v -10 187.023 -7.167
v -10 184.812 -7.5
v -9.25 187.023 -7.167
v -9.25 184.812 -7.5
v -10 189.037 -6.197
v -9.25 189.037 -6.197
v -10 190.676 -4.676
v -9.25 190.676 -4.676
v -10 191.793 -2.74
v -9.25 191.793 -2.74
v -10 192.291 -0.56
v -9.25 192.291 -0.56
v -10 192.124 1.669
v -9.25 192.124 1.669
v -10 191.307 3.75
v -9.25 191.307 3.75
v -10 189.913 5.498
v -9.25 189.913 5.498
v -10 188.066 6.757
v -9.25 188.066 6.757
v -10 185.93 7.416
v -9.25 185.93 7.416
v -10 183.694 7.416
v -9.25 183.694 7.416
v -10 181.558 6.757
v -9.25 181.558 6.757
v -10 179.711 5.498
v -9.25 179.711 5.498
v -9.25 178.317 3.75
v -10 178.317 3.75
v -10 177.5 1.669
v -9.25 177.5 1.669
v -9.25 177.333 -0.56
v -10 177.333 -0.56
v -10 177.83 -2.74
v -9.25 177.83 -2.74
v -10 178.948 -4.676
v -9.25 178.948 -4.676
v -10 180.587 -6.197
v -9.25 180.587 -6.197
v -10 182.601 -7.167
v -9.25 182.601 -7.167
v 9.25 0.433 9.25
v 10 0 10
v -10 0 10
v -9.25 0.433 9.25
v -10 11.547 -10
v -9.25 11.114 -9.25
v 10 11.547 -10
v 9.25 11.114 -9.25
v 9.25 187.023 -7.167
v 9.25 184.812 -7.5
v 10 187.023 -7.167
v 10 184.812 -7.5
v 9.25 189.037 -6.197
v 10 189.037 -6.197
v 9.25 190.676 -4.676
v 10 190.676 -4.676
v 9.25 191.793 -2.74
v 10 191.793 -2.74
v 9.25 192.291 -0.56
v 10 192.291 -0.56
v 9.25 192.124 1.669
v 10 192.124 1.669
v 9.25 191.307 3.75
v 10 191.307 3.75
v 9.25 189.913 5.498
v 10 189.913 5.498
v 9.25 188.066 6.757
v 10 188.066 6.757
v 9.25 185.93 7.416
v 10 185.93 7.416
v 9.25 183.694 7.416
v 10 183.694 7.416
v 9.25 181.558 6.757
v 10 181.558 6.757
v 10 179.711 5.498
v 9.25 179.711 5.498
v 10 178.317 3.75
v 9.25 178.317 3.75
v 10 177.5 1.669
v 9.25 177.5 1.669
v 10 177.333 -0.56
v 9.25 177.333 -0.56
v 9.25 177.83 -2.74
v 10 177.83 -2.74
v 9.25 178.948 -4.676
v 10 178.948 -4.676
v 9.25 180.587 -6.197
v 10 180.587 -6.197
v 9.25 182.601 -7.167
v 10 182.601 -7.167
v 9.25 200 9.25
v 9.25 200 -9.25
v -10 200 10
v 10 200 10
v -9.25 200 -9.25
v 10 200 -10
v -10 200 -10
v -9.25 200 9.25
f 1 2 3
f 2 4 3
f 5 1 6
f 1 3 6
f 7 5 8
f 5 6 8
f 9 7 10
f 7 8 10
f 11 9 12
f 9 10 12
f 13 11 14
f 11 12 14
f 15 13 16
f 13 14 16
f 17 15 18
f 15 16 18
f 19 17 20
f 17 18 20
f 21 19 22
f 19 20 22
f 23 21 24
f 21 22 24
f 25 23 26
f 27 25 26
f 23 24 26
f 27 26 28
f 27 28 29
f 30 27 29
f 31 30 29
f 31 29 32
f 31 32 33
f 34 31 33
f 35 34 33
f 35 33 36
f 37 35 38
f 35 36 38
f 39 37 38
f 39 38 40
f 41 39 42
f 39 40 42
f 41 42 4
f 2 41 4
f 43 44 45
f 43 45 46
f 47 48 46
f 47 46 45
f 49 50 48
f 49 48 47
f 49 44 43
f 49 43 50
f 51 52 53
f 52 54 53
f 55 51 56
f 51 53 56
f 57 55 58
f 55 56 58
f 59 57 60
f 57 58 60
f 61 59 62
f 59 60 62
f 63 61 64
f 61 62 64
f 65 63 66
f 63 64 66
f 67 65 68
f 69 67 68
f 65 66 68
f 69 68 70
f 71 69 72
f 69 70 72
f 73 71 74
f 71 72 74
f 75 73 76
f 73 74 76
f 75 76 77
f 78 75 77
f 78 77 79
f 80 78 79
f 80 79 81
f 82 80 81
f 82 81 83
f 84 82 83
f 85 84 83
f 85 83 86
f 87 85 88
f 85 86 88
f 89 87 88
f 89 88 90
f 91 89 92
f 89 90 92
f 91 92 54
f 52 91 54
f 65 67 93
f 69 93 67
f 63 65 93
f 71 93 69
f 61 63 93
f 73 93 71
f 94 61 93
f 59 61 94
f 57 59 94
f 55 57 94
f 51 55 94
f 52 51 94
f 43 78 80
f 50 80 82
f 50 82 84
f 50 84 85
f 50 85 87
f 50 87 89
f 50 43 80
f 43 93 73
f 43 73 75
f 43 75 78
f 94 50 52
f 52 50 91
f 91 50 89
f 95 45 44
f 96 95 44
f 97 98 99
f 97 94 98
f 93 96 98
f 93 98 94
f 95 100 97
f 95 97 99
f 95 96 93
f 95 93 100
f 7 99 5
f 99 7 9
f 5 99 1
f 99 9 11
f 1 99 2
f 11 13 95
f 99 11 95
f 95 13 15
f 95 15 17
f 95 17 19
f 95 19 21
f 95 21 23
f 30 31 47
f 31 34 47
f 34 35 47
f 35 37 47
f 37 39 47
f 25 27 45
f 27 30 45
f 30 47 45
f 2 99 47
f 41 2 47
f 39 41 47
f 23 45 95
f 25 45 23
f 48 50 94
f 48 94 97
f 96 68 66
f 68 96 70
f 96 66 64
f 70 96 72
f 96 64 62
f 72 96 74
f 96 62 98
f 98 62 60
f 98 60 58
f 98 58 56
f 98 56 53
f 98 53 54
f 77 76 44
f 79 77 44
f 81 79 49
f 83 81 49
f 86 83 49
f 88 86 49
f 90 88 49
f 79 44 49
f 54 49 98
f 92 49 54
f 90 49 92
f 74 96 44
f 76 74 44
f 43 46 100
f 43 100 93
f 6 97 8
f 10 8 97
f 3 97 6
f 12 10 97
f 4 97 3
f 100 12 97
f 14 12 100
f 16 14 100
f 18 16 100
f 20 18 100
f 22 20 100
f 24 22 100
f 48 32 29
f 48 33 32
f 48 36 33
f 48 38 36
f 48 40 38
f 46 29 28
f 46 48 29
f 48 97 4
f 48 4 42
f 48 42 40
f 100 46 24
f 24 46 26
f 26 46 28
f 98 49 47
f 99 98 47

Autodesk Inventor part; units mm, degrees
ref_plane "YZ Plane" through (0, 0, 0) normal (1, 0, 0) x (0, 1, 0)
ref_plane "XZ Plane" through (0, 0, 0) normal (0, 1, 0) x (-1, 0, 0)
ref_plane "XY Plane" through (0, 0, 0) normal (0, 0, 1) x (1, 0, 0)
sketch "Эскиз1" plane through (0, 0, 0) normal (0, 1, 0) x (-1, 0, 0)
  line L0 (-10, -10) -> (10, -10)
  line L1 (10, -10) -> (10, 10)
  line L2 (10, 10) -> (-10, 10)
  line L3 (-10, 10) -> (-10, -10)
  line L4 (-10, -10) -> (10, 10) construction
  line L5 (10, -10) -> (-10, 10) construction
  line L6 (-9.25, -9.25) -> (9.25, -9.25)
  line L7 (9.25, -9.25) -> (9.25, 9.25)
  line L8 (9.25, 9.25) -> (-9.25, 9.25)
  line L9 (-9.25, 9.25) -> (-9.25, -9.25)
  line L10 (-9.25, -9.25) -> (9.25, 9.25) construction
  line L11 (9.25, -9.25) -> (-9.25, 9.25) construction
  point P0 (0, 0)
  dimension "d0" = 20
  dimension "d1" = 20
  dimension "d2" = 18.5
  dimension "d3" = 18.5
extrude "Выдавливание1" add sketch "Эскиз1" along normal blind 200
sketch "Эскиз2" plane through (10, 0, 10) normal (1, 0, 0) x (0, 0, -1)
  line L0 (0, 0) -> (20, 0) projected
  line L1 (0, 0) -> (20, 11.547)
  line L2 (20, 0) -> (20, 200) projected
  line L3 (0, 0) -> (23.094, 0) construction
  line L4 (0, 0) -> (20, 0)
  line L5 (19.25, 0) -> (0.75, 0) projected
  line L6 (20, 11.547) -> (20, 0)
  point P0 (10, 0)
  dimension "d6" = 30
extrude "Выдавливание2" cut sketch "Эскиз2" against normal blind 200
sketch "Эскиз4" plane through (10, 200, 10) normal (1, 0, 0) x (0, 0, -1)
  circle A0 centre (10, -15.1881) radius 7.5
  point P0 (10, -200)
  dimension "d9" = 15
extrude "Выдавливание3" cut sketch "Эскиз4" against normal blind 124
properties part number "опора кинематик стенд"
